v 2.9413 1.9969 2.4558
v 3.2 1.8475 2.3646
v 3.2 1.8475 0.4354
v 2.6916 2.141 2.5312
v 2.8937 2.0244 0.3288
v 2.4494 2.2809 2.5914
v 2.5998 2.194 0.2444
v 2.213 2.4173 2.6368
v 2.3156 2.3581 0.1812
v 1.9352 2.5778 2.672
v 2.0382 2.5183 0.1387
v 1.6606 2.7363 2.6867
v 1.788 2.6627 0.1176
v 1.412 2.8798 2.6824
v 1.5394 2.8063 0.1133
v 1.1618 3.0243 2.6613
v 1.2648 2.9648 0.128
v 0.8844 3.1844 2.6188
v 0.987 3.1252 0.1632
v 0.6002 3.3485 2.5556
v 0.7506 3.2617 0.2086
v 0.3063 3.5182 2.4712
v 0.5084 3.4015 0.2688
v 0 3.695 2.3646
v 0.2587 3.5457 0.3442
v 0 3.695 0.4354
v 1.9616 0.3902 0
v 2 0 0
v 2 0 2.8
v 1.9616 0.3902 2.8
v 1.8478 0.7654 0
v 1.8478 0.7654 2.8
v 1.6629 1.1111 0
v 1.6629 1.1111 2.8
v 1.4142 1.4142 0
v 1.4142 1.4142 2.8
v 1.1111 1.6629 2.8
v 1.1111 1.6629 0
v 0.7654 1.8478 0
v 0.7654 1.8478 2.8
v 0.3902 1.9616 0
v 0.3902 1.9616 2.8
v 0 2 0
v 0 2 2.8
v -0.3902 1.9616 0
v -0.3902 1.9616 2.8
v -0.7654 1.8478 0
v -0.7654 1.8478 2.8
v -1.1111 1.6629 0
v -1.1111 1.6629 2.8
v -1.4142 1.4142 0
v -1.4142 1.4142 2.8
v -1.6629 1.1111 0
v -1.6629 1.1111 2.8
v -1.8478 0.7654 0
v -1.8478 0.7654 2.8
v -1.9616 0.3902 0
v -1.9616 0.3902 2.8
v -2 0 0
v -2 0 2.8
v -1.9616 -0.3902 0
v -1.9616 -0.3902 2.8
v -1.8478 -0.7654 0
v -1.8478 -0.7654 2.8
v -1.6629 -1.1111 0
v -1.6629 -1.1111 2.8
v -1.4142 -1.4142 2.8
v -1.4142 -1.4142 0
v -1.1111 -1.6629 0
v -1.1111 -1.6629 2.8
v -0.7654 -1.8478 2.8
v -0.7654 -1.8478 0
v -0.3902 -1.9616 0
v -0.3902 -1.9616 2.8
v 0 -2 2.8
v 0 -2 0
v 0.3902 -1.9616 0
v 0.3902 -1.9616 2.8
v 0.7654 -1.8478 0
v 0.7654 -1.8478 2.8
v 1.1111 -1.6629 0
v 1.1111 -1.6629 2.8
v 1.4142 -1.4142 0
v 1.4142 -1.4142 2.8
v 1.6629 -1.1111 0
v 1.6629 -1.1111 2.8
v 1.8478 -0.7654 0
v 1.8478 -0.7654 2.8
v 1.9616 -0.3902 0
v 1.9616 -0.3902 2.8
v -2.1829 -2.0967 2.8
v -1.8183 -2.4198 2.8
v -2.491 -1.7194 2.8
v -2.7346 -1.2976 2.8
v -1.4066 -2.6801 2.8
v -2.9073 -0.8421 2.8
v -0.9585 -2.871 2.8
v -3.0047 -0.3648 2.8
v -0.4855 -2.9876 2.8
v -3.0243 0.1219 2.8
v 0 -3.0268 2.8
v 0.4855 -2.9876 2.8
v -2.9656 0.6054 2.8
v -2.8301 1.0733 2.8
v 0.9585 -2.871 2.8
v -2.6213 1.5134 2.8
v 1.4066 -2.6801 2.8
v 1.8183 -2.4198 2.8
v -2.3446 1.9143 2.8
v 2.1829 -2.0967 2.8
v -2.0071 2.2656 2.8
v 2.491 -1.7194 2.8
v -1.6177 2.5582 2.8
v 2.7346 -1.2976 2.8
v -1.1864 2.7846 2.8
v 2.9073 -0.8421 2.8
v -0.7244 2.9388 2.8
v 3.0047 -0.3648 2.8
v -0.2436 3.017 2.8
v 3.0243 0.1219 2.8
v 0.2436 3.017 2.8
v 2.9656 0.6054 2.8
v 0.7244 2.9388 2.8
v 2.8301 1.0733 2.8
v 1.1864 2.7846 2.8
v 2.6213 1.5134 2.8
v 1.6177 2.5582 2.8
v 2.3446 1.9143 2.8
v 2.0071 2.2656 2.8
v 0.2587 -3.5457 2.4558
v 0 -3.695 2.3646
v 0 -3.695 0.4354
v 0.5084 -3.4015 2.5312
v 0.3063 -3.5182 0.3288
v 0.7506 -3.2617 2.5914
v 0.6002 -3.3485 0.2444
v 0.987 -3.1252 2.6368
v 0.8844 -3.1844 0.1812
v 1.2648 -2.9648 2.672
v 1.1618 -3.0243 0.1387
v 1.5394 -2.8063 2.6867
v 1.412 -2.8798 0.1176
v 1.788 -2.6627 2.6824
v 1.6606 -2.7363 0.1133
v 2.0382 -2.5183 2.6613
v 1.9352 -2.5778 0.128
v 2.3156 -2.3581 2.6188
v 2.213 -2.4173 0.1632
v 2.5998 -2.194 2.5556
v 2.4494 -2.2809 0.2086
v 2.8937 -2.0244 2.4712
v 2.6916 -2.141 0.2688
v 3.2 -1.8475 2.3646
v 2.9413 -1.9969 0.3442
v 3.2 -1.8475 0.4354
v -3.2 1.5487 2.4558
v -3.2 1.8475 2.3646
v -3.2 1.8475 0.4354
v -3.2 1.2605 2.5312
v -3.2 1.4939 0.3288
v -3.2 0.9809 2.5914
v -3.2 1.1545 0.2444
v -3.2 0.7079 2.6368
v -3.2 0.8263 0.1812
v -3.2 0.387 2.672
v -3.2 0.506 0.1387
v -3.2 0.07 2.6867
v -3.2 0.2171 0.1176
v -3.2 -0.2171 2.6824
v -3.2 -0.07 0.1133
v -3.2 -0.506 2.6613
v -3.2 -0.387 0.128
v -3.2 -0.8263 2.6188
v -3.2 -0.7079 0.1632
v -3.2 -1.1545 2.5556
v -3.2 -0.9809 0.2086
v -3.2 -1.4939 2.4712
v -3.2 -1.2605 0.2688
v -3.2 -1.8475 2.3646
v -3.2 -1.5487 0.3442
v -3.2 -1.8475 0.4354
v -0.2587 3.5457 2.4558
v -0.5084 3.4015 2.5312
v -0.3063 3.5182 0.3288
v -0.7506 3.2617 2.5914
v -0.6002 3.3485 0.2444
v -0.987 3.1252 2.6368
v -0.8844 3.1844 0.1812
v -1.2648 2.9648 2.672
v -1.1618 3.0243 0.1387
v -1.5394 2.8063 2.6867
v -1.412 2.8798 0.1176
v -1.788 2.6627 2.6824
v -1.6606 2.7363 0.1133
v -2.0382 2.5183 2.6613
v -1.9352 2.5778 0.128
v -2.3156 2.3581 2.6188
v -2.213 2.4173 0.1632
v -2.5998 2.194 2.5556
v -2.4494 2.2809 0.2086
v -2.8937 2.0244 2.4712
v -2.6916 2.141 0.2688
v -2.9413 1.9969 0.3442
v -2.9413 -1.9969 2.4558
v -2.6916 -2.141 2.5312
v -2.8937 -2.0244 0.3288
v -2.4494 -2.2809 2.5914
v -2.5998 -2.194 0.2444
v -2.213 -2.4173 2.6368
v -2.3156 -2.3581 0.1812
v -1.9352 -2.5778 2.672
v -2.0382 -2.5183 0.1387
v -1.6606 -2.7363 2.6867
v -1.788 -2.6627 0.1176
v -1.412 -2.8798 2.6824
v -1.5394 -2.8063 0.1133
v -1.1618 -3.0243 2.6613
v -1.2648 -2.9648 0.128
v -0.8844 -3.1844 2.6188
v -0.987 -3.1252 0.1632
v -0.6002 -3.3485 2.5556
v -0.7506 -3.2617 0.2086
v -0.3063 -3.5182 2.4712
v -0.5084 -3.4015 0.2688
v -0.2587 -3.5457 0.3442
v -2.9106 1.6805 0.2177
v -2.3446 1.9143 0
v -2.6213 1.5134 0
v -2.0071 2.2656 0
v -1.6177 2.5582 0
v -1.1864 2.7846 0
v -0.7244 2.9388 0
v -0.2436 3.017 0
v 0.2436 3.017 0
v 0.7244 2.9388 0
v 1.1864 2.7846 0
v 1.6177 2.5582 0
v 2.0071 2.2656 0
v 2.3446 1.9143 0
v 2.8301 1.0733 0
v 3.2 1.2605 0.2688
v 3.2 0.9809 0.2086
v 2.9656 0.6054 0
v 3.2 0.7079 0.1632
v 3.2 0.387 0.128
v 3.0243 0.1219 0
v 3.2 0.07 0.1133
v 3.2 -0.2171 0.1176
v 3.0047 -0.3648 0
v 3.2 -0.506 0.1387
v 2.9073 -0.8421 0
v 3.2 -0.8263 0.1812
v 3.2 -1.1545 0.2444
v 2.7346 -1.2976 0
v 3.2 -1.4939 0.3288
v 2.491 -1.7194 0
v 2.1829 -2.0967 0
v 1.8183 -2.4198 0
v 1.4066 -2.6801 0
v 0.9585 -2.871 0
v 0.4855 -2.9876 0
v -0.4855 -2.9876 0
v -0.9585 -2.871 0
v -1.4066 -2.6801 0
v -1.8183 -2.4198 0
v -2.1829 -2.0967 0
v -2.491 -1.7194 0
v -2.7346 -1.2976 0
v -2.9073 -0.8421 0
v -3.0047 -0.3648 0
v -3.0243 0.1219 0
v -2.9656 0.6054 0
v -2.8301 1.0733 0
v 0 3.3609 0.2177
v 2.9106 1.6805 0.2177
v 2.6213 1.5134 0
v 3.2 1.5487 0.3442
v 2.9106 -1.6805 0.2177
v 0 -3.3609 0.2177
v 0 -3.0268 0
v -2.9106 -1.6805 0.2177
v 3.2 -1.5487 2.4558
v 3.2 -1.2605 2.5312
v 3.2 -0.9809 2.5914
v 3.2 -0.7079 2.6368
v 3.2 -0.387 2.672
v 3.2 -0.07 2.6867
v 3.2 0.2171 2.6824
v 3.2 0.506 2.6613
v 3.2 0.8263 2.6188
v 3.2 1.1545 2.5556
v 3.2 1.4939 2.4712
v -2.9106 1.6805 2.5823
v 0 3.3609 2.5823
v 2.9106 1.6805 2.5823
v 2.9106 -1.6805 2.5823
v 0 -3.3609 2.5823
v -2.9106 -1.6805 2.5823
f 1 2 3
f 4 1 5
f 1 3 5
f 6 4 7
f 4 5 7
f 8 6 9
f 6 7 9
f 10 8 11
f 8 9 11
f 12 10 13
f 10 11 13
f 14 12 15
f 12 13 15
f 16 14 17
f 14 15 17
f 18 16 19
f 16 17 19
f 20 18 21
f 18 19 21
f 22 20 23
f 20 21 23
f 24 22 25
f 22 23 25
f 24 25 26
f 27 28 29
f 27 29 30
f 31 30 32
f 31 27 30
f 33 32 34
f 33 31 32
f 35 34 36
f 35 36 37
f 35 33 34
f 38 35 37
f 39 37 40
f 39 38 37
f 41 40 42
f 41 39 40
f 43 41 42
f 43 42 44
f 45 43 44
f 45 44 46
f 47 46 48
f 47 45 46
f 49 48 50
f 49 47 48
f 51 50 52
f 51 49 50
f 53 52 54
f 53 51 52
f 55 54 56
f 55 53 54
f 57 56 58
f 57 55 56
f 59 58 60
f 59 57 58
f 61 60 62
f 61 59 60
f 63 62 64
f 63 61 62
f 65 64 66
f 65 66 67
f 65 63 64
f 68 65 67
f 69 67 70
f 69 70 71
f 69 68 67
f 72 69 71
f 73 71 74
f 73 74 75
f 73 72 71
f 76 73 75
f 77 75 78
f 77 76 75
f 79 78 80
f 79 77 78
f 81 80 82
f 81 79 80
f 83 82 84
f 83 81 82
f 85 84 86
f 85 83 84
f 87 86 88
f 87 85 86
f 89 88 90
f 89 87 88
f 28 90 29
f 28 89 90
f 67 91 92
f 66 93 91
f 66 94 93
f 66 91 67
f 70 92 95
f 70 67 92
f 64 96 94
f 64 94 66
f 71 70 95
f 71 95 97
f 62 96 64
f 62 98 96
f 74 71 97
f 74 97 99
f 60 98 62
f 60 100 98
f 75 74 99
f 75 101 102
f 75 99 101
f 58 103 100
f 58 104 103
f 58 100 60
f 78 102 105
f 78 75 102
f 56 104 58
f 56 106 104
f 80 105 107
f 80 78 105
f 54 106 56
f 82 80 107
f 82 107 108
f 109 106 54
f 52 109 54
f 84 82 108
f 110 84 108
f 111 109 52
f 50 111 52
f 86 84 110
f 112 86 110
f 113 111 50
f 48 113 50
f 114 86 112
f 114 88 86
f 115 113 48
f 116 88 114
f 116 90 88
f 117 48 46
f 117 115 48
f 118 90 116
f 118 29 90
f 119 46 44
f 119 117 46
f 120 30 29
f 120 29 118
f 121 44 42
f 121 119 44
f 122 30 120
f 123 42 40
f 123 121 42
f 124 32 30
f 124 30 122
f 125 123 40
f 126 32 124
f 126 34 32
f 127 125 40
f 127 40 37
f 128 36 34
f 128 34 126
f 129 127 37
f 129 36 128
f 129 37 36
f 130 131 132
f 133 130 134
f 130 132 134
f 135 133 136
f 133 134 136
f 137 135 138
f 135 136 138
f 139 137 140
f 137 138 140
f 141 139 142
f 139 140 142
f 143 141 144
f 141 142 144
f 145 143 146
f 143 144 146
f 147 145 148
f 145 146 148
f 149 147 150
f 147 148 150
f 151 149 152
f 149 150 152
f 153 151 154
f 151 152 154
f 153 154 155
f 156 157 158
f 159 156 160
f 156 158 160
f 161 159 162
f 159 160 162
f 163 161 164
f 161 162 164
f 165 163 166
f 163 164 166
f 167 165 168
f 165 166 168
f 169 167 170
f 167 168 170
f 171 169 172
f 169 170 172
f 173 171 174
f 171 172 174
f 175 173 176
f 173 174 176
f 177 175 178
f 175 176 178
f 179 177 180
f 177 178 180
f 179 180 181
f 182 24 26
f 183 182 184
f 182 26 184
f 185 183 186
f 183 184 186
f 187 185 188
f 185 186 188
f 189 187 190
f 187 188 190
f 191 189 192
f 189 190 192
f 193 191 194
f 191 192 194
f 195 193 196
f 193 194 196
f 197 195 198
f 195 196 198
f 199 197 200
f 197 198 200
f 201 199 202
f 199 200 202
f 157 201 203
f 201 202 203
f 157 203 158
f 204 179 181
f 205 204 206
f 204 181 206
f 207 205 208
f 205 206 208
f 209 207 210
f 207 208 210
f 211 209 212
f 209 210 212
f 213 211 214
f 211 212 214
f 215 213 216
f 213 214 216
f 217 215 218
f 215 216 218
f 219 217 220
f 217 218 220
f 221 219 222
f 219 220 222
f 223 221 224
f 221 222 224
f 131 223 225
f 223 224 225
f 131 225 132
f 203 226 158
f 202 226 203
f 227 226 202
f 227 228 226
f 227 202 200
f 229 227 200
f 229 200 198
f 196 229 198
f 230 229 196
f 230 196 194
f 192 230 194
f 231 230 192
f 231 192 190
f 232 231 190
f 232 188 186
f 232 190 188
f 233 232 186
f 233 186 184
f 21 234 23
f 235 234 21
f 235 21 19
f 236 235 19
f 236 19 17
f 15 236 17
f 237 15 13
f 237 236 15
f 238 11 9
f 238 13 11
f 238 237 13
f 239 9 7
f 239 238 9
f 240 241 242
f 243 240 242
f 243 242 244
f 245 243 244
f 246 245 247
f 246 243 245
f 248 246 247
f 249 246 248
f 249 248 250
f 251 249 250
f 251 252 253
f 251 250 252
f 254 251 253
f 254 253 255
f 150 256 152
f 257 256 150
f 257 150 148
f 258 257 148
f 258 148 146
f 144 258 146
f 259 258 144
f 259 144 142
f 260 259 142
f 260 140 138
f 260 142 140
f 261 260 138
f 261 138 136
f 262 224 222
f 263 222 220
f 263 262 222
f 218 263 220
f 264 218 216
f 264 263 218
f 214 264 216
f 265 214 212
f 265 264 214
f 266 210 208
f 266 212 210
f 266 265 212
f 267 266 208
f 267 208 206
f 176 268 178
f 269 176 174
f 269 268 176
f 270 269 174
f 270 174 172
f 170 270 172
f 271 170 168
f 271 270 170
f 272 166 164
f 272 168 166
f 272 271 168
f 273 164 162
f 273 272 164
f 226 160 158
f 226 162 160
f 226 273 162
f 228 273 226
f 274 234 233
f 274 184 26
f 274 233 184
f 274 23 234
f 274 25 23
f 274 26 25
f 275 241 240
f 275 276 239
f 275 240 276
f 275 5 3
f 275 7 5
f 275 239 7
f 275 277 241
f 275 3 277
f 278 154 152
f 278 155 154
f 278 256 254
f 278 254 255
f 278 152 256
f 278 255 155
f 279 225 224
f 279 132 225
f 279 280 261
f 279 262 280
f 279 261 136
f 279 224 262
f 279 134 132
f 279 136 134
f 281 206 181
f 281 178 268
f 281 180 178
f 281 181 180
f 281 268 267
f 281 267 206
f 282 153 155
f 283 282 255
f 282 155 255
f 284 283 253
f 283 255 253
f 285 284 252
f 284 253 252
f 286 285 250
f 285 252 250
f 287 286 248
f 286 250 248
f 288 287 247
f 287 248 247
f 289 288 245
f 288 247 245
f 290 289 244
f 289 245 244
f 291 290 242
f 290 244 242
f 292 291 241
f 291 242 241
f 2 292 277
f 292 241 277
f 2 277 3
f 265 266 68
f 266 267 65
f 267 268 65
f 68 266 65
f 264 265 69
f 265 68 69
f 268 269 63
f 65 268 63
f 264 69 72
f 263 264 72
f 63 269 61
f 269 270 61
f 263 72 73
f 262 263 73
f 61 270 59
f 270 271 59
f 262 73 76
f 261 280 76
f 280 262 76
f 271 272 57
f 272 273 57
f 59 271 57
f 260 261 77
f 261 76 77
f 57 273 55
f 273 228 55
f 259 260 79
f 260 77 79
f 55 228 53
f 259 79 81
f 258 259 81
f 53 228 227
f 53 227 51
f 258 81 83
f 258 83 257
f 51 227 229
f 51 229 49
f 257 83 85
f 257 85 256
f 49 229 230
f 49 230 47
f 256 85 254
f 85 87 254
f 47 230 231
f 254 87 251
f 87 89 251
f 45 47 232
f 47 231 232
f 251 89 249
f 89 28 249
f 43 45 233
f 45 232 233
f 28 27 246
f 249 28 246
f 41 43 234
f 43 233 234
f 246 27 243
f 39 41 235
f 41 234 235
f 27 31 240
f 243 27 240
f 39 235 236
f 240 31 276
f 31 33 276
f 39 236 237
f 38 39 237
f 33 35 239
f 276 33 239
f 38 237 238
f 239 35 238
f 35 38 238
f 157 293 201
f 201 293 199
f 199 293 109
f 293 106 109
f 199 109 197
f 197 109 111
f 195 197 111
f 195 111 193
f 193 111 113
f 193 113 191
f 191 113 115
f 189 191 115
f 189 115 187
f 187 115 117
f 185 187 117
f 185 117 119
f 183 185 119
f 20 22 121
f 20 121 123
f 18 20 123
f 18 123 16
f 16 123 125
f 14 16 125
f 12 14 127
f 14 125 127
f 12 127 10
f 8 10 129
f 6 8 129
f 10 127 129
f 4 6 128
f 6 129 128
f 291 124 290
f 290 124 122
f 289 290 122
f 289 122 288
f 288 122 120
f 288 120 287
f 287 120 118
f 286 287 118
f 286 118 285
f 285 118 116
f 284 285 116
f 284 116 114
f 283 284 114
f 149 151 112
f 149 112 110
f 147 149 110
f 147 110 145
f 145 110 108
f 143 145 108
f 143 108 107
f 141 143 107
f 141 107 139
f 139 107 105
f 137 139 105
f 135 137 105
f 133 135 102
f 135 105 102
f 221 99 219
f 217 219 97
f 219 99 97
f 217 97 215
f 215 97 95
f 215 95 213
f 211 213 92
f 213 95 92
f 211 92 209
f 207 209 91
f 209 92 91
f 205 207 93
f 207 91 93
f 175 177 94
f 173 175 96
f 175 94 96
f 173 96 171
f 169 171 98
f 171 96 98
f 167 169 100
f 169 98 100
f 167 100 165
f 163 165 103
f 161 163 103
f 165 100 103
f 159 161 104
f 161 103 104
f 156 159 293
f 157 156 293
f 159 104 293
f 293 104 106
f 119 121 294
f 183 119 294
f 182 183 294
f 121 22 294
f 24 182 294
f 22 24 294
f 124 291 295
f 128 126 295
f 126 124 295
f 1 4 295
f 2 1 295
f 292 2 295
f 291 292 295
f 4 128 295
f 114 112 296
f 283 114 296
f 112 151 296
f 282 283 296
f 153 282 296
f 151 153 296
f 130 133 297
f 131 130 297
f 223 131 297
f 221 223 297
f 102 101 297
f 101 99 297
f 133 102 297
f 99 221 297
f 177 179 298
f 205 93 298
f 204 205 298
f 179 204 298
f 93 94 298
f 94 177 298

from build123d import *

# Parameters (mm, degrees)
SKETCH_1_R      = 2
EXTRUDE_1_DEPTH = 2.8


with BuildPart() as part:
    # 草图1 → 凸台-拉伸1 (new body)
    with BuildSketch(Plane.XY):
        Polygon((0, 3.695041723), (-3.2, 1.847520861), (-3.2, -1.847520861), (0, -3.695041723), (3.2, -1.847520861), (3.2, 1.847520861), align=None)
        Circle(SKETCH_1_R, mode=Mode.SUBTRACT)
    extrude(amount=EXTRUDE_1_DEPTH)

    # 草图2 → 切除-旋转1 (revolve, cut)
    with BuildSketch(Plane(origin=(0, 0, 0), x_dir=(0, 0, -1), z_dir=(1, 0, 0)), mode=Mode.PRIVATE) as cut_revolve_1_sk:
        Polygon((-2.364617701, 3.695041723), (-2.8, 3.026797752), (-2.8, 3.695041723), align=None)
    cut_revolve_1 = revolve(cut_revolve_1_sk.sketch.rotate(Axis((0, 0, 2.8), (0, 0, -1)), 300.000000046), axis=Axis((0, 0, 2.8), (0, 0, -1)), mode=Mode.SUBTRACT)

    # 镜向1: 切除-旋转1 across plane
    add(cut_revolve_1.mirror(Plane(origin=(0, 0, 1.4), x_dir=(1, 0, 0), z_dir=(0, 0, -1))), mode=Mode.SUBTRACT)


solid = part.part
